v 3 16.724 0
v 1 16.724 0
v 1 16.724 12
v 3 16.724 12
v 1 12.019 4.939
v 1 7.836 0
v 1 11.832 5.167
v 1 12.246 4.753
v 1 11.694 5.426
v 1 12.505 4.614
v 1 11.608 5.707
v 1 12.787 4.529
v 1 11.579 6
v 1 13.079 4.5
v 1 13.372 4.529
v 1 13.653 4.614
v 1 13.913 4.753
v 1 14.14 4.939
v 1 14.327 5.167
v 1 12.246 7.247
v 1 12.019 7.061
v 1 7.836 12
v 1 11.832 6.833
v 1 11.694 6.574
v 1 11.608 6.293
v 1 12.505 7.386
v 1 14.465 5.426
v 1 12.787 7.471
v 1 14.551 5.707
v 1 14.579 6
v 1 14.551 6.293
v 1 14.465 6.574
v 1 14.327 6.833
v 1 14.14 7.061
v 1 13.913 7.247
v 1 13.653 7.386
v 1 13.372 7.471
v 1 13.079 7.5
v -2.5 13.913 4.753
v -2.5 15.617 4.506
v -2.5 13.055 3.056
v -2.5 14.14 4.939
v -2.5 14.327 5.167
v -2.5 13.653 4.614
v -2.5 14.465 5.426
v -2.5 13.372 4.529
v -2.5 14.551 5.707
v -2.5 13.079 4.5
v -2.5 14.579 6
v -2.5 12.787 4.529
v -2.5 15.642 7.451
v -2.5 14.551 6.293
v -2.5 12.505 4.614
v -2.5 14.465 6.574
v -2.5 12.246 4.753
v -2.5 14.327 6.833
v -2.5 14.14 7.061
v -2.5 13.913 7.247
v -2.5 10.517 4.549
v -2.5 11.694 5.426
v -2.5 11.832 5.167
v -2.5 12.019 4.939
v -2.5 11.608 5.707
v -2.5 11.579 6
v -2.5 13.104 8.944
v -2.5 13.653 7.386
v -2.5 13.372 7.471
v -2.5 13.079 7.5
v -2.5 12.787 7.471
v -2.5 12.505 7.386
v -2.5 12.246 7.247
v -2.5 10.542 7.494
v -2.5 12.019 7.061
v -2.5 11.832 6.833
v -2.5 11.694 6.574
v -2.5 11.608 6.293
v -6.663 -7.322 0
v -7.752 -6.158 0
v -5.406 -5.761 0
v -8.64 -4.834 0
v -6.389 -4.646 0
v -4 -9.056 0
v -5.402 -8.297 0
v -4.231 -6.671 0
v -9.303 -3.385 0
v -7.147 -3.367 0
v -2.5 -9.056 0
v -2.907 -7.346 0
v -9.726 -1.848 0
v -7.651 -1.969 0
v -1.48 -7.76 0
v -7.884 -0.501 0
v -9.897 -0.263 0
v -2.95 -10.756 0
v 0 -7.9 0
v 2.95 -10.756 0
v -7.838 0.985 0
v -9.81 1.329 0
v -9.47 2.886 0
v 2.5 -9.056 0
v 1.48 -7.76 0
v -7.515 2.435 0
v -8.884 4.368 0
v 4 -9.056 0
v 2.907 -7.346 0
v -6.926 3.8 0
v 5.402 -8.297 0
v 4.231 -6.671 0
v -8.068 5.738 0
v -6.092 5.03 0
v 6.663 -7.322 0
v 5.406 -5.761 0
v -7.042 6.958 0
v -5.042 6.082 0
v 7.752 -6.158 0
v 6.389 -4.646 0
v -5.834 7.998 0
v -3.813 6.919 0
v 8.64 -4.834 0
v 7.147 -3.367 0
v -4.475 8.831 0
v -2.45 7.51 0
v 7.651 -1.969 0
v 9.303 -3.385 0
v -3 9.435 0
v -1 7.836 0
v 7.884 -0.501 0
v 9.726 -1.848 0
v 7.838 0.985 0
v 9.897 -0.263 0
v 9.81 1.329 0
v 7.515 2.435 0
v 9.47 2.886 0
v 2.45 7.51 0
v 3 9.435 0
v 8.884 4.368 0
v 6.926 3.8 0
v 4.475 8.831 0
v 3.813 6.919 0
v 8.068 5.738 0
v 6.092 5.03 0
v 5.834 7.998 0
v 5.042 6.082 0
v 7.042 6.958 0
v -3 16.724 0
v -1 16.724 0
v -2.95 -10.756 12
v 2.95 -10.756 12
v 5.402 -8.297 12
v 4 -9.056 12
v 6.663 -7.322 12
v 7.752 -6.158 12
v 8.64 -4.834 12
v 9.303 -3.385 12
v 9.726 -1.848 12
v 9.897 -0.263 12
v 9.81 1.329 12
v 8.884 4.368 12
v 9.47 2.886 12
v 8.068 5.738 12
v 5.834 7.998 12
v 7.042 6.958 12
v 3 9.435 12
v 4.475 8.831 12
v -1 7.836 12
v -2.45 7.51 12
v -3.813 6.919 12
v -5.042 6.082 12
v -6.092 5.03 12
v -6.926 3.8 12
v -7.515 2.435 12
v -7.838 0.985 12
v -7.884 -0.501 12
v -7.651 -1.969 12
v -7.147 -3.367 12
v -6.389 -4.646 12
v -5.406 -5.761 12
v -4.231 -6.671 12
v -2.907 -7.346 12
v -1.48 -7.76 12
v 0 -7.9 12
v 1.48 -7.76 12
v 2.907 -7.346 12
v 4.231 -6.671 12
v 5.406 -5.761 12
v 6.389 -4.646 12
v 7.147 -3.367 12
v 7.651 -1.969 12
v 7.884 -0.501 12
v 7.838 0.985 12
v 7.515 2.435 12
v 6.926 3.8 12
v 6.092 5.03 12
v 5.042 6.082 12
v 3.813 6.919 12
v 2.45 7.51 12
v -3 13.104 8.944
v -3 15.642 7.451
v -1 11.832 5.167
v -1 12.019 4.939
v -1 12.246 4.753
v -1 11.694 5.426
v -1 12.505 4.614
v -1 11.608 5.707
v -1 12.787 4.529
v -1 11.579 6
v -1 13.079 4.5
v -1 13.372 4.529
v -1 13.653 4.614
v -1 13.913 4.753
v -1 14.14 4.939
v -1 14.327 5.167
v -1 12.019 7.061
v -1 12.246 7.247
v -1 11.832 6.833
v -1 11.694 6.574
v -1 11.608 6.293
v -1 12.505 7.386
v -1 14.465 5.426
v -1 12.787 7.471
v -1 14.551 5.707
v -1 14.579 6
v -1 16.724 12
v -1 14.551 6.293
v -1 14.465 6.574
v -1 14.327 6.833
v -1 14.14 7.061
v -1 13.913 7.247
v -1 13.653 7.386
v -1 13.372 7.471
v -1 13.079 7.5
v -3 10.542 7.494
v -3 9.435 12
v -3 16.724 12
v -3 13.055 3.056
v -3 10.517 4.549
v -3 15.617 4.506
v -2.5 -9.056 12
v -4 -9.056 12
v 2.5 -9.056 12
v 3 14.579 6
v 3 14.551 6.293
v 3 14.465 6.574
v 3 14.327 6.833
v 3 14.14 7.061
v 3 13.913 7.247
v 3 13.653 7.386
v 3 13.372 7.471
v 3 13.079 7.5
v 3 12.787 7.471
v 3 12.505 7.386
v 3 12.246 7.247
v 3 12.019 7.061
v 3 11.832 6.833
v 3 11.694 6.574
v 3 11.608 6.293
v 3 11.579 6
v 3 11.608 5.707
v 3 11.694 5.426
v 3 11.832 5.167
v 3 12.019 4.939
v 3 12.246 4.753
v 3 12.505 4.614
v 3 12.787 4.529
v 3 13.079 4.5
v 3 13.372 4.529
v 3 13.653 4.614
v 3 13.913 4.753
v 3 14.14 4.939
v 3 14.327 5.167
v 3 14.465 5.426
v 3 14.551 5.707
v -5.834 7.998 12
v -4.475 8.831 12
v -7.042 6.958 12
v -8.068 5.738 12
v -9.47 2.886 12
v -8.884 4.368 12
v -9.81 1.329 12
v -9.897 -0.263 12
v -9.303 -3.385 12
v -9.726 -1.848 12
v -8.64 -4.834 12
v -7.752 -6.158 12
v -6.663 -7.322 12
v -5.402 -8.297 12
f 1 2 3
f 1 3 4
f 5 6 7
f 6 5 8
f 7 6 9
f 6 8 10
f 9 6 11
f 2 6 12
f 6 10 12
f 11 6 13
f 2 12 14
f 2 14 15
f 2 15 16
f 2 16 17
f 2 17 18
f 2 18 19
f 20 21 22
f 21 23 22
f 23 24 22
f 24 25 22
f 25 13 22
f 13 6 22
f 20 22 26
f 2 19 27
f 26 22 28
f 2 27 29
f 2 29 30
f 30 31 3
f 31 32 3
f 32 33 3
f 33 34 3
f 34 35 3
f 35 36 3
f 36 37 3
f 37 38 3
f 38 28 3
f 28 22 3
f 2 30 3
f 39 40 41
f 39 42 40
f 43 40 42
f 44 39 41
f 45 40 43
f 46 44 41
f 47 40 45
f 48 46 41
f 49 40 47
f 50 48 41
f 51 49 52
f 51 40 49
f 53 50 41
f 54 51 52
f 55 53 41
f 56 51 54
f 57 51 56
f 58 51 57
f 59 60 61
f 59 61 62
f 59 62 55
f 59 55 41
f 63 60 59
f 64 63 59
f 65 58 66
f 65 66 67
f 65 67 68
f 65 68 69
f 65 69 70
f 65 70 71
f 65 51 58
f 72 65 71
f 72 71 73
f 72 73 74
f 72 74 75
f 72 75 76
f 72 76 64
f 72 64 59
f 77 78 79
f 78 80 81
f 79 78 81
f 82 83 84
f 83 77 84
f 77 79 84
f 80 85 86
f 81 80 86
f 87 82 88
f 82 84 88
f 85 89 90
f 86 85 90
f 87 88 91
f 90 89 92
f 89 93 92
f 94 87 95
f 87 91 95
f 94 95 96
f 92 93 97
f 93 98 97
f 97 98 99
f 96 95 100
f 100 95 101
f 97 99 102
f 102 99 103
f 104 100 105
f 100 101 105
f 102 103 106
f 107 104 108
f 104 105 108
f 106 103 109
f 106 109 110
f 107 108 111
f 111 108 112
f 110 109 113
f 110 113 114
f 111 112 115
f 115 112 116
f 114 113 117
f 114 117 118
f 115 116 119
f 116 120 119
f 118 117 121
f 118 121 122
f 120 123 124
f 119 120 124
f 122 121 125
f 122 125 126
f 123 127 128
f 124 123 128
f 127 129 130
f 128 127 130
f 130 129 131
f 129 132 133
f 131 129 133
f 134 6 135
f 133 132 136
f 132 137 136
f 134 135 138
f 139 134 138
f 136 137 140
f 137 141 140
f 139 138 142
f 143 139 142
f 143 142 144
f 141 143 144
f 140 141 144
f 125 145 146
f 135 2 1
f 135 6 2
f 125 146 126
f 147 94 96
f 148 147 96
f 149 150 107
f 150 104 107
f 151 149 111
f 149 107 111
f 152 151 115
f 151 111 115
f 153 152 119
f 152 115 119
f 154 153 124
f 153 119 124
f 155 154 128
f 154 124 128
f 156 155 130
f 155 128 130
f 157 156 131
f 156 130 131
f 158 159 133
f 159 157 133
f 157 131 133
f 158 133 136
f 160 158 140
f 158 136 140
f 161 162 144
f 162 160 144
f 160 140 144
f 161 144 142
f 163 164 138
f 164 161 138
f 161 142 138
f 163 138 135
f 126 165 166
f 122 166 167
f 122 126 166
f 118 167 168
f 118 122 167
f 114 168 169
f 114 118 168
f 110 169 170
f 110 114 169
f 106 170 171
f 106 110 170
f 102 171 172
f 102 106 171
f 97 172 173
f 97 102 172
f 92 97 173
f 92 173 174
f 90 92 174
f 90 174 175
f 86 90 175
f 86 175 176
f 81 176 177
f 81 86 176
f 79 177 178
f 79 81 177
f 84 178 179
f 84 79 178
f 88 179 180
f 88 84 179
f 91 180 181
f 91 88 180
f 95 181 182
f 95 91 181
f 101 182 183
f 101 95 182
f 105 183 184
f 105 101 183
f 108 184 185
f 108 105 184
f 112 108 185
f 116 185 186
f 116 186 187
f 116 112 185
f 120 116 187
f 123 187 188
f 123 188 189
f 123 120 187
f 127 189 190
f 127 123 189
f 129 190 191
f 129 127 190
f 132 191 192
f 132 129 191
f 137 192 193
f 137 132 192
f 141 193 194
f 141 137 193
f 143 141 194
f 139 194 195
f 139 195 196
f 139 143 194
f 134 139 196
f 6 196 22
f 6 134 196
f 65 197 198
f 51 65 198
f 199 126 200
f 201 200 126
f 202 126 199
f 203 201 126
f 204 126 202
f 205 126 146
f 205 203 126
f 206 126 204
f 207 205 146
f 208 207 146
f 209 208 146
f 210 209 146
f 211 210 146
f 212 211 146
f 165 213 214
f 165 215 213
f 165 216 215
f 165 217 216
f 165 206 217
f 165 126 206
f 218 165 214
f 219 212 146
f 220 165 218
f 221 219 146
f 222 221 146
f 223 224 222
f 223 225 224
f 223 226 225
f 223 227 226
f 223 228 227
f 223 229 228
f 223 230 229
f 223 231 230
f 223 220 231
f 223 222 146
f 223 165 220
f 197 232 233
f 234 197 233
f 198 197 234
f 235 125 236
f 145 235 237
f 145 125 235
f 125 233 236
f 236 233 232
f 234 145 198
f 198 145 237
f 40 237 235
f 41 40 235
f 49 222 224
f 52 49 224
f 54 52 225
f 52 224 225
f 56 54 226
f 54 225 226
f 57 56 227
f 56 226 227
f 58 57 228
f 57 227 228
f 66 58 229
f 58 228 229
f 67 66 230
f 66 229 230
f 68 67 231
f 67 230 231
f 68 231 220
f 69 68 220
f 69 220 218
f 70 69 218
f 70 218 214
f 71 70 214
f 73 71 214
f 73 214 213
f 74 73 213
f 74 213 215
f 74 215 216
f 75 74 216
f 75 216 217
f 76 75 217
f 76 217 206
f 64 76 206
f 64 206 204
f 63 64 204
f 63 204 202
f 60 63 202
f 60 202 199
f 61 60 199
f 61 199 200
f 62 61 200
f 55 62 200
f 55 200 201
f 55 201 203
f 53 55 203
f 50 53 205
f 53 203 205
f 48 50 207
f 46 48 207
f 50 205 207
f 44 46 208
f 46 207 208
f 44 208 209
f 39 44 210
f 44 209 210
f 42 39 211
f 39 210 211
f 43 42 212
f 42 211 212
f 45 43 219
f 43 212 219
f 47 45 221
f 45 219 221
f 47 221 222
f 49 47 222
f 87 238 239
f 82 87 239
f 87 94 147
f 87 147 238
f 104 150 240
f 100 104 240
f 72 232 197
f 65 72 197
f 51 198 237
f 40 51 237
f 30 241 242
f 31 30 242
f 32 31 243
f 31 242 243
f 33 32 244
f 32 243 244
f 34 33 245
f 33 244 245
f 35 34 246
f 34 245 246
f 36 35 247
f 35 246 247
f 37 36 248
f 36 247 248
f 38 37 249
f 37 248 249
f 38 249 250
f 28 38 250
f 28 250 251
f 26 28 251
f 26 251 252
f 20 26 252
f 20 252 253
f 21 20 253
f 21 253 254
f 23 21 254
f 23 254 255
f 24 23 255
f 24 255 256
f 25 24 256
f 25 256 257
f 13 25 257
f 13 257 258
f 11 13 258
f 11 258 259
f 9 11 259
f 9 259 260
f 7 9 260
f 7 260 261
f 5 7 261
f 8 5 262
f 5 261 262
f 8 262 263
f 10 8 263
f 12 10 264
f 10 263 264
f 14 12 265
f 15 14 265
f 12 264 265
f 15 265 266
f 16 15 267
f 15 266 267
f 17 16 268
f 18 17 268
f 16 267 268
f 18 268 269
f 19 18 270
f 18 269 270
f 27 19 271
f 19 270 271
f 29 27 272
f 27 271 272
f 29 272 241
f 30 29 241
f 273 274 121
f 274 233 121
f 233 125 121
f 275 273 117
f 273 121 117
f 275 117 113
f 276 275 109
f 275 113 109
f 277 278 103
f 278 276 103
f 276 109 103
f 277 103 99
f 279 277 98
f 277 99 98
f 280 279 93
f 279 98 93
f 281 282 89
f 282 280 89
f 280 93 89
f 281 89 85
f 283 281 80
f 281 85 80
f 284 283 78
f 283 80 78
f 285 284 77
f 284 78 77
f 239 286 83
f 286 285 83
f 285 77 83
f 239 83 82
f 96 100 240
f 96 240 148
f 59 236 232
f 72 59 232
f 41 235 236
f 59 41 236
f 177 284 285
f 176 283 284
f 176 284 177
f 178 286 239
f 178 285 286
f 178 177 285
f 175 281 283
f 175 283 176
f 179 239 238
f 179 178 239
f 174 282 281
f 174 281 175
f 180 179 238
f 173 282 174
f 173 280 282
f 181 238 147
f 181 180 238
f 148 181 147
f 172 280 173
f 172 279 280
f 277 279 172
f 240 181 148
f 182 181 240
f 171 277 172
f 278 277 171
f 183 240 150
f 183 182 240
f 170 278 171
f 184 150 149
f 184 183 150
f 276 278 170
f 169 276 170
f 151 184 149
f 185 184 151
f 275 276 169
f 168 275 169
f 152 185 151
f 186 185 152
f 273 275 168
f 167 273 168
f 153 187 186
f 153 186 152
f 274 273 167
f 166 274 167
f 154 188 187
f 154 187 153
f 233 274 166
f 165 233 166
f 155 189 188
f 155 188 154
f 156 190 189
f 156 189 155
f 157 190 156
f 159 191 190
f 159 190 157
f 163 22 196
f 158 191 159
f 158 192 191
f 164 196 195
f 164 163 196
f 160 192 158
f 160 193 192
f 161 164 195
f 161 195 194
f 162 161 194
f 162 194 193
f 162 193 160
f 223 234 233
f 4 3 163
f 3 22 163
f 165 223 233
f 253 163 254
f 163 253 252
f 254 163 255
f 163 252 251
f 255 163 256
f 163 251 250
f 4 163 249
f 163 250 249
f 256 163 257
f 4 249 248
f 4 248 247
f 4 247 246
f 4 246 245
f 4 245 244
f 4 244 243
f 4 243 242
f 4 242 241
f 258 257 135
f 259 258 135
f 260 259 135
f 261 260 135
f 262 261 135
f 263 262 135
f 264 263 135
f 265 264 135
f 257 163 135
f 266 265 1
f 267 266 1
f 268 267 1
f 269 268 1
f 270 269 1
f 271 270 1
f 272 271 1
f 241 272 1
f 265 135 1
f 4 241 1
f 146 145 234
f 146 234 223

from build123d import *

# Parameters (mm, degrees)
F0_R      = 9.9
F0_R_2    = 7.9
F1_DEPTH  = 12
F3_DEPTH  = 12
F5_DEPTH  = 12.001
F6_W      = 2
F6_H      = 4.608413
F7_DEPTH  = 12.001
F8_W      = 2
F8_H      = 8
F9_DEPTH  = 12
F10_R     = 1.5
F11_DEPTH = 12.901
F13_DEPTH = 0.5


with BuildPart() as f1:
    # F0 (on Top) → F1 (new body)
    with BuildSketch(Plane.XY):
        Circle(F0_R)
        Circle(F0_R_2, mode=Mode.SUBTRACT)
    extrude(amount=F1_DEPTH)

    # F2 (on Top) → F3 (join)
    with BuildSketch(Plane.XY):
        Polygon((4, -9.055937), (0, -9.055937), (-4, -9.055937), (-4, -10.755937), (4, -10.755937), align=None)
    extrude(amount=F3_DEPTH)

    # F4 (on Top) → F5 (cut, through all)
    with BuildSketch(Plane.XY):
        Polygon((4, -9.055937), (2.5, -9.055937), (2.95, -10.755937), (4, -10.755937), align=None)
        Polygon((-2.95, -10.755937), (-2.5, -9.055937), (-4, -9.055937), (-4, -10.755937), align=None)
    extrude(amount=F5_DEPTH, mode=Mode.SUBTRACT)

    # F6 (on face) → F7 (cut, through all)
    with BuildSketch(Plane.XY.offset(12)):
        with Locations((0, 10.140659)):
            Rectangle(F6_W, F6_H)
    extrude(amount=-F7_DEPTH, mode=Mode.SUBTRACT)

    # F8 (on Top) → F9 (join)
    with BuildSketch(Plane.XY):
        with Locations((-2, 12.724238)):
            Rectangle(F8_W, F8_H)
        with Locations((2, 12.724238)):
            Rectangle(F8_W, F8_H)
    extrude(amount=F9_DEPTH)

    # F10 (on face) → F11 (cut, through all)
    with BuildSketch(Plane.YZ.offset(3)):
        with Locations((13.079374, 6)):
            Circle(F10_R)
    extrude(amount=-F11_DEPTH, mode=Mode.SUBTRACT)

    # F12 (on face) → F13 (cut)
    with BuildSketch(Plane(origin=(-3, 0, 0), x_dir=(0, -1, 0), z_dir=(-1, 0, 0))):
        Polygon((-13.104217, 8.944382), (-15.641705, 7.450677), (-15.616863, 4.506295), (-13.054532, 3.055618), (-10.517044, 4.549323), (-10.541886, 7.493705), align=None)
    extrude(amount=-F13_DEPTH, mode=Mode.SUBTRACT)


solid = f1.part
